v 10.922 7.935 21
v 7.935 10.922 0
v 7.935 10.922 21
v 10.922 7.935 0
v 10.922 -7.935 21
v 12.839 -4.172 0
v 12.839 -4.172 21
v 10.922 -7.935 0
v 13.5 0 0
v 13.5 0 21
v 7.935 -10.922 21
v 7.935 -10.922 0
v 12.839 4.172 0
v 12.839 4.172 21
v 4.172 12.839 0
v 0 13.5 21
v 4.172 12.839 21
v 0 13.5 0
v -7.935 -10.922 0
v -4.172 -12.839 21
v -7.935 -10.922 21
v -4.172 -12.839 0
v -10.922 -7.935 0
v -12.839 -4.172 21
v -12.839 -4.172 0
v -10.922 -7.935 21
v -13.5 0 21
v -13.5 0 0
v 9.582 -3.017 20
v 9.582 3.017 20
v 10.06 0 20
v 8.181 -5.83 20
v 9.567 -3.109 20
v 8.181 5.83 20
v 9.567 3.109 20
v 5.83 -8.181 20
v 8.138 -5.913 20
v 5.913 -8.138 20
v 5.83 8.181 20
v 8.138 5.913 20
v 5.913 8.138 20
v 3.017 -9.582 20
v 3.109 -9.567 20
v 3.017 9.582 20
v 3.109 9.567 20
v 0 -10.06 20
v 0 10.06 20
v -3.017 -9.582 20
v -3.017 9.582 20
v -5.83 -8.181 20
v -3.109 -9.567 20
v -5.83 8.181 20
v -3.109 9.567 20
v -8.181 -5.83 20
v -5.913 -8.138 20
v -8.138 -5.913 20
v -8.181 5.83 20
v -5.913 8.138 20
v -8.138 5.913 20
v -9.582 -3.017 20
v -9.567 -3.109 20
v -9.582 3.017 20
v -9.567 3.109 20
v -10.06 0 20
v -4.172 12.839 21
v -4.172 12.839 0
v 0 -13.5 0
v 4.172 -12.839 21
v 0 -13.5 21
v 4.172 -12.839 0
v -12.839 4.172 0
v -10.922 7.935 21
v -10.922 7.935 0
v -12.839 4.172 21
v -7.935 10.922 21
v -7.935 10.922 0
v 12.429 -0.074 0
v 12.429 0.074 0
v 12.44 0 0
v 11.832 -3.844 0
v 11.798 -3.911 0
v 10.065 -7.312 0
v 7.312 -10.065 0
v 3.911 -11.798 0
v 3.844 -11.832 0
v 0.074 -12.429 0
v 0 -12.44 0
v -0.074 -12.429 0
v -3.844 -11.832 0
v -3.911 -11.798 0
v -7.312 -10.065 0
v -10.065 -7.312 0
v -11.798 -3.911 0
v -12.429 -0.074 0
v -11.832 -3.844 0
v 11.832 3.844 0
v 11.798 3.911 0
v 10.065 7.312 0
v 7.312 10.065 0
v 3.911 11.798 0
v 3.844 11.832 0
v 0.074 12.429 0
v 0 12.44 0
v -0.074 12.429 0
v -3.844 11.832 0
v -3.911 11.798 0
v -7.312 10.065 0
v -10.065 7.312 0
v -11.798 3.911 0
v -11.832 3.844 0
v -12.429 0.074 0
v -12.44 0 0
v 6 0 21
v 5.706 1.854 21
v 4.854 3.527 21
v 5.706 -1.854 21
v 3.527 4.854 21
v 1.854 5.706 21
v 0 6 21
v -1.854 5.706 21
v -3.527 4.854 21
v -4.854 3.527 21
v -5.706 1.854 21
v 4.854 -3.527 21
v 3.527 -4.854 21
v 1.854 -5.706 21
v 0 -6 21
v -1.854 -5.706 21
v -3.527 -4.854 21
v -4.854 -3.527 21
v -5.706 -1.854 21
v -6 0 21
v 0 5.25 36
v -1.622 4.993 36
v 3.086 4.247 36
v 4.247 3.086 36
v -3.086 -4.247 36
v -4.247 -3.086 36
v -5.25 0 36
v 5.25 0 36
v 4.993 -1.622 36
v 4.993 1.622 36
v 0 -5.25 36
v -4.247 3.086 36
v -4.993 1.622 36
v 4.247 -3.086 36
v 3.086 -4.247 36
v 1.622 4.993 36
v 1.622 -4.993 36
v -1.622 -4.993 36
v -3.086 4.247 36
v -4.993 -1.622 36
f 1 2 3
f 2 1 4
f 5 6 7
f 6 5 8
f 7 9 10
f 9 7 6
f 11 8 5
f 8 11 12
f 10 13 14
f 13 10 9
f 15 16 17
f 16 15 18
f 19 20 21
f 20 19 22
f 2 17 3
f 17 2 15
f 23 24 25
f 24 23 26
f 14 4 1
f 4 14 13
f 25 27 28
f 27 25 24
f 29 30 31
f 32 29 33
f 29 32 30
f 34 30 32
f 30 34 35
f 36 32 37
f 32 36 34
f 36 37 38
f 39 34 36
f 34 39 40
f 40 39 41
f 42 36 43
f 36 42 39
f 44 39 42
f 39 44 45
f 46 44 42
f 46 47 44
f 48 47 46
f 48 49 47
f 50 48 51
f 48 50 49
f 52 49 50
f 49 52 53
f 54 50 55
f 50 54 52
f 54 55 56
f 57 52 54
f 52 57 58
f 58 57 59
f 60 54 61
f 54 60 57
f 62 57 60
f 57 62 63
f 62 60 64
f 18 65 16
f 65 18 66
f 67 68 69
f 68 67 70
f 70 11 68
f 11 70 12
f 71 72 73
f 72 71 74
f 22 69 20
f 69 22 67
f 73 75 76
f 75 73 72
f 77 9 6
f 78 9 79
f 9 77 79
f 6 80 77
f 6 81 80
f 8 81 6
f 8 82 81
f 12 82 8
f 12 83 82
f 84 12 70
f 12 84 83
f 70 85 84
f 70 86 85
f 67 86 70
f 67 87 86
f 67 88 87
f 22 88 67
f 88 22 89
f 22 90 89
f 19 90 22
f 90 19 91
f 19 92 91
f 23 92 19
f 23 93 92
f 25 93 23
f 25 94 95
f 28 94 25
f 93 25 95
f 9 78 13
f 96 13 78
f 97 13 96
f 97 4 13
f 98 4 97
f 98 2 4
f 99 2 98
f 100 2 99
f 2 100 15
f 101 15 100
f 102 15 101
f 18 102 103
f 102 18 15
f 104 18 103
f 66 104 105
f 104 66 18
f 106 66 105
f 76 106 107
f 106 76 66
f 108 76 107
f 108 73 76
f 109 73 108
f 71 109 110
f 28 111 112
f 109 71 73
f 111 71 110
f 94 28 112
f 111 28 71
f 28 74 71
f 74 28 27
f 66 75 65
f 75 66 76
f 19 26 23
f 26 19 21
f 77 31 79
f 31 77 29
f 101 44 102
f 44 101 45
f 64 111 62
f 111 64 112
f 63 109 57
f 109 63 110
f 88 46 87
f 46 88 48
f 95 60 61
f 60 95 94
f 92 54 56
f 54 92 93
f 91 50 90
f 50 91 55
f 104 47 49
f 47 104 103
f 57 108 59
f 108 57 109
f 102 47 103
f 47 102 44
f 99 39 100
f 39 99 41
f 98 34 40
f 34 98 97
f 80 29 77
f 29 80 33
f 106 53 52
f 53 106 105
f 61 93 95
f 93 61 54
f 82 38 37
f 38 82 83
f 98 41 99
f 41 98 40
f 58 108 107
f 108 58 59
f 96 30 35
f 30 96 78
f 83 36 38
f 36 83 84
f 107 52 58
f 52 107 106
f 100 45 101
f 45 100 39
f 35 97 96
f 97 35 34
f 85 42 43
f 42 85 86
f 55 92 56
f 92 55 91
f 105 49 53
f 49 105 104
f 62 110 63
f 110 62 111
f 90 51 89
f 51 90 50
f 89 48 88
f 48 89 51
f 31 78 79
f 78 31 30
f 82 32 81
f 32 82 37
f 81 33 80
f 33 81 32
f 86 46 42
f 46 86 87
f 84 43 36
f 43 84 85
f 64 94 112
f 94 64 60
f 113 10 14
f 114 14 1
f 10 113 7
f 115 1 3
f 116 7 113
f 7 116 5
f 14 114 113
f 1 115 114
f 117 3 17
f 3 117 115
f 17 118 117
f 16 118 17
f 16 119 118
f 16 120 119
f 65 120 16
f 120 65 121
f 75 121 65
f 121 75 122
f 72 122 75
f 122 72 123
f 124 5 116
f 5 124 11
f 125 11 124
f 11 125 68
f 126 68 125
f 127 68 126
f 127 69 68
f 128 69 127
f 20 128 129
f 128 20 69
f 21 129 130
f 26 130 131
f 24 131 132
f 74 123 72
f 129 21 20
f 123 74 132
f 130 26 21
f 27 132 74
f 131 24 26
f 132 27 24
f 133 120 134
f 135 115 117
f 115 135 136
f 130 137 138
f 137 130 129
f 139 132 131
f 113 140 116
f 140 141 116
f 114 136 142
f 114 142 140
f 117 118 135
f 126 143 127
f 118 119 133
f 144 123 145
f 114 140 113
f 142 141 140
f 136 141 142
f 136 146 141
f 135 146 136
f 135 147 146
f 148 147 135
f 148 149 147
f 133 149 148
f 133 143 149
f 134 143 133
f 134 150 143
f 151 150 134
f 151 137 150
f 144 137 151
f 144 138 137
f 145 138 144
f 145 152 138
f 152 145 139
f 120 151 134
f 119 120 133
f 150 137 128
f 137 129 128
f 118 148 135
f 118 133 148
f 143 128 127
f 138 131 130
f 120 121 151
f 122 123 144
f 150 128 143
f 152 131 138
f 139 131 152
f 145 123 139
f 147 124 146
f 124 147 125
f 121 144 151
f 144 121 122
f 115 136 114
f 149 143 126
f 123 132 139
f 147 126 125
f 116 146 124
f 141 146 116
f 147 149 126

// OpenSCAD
/*
 * Candle Adapter, v0.42
 *
 * by Alex Franke (CodeCreations), Dec 2012
 * http://www.theFrankes.com
 * 
 * Licenced under Creative Commons Attribution - Non-Commercial - Share Alike 3.0 
 * 
 * DESCRIPTION: This will allow you to put a fat candle into a smaller hole. 
 * 
 * INSTRUCTIONS:  Choose some values in the "User-defined values" section, render,
 *   and print. See the comments in that section for details on how to measure. 
 * 
 * v0.42, Dec 15, 2012: Initial Release.
 * 
 * TODO: 
 *   * Make shorter for smaller candles placed in larger holes 
 */

/////////////////////////////////////////////////////////////////////////////
// User-defined values... 
/////////////////////////////////////////////////////////////////////////////

// At the base of the candle, measure the distance the candle will be inserted into the 
// holder (fLength), the diameter of the candle at that distance form the end (fTopID), 
// and the diameter of the candle at the end (fBottomID). (This assumes a consistent 
// taper.) Finally, set the minimum thickness (thickness) of the printed material 
// surrounding the candle. 
fLength     = 20; 
fTopID      = 25; 
fBottomID   = 20; 
thickness   = 1; 

// Measure the depth of the hole (mLength), the diameter of the opening at the top 
// (mTopOD), and the diamater of the hole at the bottom (mBottomOD). (This also 
// assumes a consistent taper.)
mLength     = 15; 
mTopOD      = 12; 
mBottomOD   = 10.5; 

$fn         = 20; // general curve quality


/////////////////////////////////////////////////////////////////////////////
// The code...
/////////////////////////////////////////////////////////////////////////////
translate([0,0,thickness/2+fLength]) 
rotate([180,0,0]) 
union() {

	// Female
	translate([0,0,(fLength+thickness)/2]) 
	difference(){ 
		cylinder(h=fLength, r=fTopID/2+thickness, center=true);
		cylinder(h=fLength+1, r2=fTopID/2, r1=fBottomID/2, center=true);
	}

	cylinder(h=thickness, r=fTopID/2+thickness, center=true);

	// Male
	translate([0,0,-(mLength+thickness)/2]) 
	cylinder(h=mLength, r2=mTopOD/2, r1=mBottomOD/2, center=true);
}
